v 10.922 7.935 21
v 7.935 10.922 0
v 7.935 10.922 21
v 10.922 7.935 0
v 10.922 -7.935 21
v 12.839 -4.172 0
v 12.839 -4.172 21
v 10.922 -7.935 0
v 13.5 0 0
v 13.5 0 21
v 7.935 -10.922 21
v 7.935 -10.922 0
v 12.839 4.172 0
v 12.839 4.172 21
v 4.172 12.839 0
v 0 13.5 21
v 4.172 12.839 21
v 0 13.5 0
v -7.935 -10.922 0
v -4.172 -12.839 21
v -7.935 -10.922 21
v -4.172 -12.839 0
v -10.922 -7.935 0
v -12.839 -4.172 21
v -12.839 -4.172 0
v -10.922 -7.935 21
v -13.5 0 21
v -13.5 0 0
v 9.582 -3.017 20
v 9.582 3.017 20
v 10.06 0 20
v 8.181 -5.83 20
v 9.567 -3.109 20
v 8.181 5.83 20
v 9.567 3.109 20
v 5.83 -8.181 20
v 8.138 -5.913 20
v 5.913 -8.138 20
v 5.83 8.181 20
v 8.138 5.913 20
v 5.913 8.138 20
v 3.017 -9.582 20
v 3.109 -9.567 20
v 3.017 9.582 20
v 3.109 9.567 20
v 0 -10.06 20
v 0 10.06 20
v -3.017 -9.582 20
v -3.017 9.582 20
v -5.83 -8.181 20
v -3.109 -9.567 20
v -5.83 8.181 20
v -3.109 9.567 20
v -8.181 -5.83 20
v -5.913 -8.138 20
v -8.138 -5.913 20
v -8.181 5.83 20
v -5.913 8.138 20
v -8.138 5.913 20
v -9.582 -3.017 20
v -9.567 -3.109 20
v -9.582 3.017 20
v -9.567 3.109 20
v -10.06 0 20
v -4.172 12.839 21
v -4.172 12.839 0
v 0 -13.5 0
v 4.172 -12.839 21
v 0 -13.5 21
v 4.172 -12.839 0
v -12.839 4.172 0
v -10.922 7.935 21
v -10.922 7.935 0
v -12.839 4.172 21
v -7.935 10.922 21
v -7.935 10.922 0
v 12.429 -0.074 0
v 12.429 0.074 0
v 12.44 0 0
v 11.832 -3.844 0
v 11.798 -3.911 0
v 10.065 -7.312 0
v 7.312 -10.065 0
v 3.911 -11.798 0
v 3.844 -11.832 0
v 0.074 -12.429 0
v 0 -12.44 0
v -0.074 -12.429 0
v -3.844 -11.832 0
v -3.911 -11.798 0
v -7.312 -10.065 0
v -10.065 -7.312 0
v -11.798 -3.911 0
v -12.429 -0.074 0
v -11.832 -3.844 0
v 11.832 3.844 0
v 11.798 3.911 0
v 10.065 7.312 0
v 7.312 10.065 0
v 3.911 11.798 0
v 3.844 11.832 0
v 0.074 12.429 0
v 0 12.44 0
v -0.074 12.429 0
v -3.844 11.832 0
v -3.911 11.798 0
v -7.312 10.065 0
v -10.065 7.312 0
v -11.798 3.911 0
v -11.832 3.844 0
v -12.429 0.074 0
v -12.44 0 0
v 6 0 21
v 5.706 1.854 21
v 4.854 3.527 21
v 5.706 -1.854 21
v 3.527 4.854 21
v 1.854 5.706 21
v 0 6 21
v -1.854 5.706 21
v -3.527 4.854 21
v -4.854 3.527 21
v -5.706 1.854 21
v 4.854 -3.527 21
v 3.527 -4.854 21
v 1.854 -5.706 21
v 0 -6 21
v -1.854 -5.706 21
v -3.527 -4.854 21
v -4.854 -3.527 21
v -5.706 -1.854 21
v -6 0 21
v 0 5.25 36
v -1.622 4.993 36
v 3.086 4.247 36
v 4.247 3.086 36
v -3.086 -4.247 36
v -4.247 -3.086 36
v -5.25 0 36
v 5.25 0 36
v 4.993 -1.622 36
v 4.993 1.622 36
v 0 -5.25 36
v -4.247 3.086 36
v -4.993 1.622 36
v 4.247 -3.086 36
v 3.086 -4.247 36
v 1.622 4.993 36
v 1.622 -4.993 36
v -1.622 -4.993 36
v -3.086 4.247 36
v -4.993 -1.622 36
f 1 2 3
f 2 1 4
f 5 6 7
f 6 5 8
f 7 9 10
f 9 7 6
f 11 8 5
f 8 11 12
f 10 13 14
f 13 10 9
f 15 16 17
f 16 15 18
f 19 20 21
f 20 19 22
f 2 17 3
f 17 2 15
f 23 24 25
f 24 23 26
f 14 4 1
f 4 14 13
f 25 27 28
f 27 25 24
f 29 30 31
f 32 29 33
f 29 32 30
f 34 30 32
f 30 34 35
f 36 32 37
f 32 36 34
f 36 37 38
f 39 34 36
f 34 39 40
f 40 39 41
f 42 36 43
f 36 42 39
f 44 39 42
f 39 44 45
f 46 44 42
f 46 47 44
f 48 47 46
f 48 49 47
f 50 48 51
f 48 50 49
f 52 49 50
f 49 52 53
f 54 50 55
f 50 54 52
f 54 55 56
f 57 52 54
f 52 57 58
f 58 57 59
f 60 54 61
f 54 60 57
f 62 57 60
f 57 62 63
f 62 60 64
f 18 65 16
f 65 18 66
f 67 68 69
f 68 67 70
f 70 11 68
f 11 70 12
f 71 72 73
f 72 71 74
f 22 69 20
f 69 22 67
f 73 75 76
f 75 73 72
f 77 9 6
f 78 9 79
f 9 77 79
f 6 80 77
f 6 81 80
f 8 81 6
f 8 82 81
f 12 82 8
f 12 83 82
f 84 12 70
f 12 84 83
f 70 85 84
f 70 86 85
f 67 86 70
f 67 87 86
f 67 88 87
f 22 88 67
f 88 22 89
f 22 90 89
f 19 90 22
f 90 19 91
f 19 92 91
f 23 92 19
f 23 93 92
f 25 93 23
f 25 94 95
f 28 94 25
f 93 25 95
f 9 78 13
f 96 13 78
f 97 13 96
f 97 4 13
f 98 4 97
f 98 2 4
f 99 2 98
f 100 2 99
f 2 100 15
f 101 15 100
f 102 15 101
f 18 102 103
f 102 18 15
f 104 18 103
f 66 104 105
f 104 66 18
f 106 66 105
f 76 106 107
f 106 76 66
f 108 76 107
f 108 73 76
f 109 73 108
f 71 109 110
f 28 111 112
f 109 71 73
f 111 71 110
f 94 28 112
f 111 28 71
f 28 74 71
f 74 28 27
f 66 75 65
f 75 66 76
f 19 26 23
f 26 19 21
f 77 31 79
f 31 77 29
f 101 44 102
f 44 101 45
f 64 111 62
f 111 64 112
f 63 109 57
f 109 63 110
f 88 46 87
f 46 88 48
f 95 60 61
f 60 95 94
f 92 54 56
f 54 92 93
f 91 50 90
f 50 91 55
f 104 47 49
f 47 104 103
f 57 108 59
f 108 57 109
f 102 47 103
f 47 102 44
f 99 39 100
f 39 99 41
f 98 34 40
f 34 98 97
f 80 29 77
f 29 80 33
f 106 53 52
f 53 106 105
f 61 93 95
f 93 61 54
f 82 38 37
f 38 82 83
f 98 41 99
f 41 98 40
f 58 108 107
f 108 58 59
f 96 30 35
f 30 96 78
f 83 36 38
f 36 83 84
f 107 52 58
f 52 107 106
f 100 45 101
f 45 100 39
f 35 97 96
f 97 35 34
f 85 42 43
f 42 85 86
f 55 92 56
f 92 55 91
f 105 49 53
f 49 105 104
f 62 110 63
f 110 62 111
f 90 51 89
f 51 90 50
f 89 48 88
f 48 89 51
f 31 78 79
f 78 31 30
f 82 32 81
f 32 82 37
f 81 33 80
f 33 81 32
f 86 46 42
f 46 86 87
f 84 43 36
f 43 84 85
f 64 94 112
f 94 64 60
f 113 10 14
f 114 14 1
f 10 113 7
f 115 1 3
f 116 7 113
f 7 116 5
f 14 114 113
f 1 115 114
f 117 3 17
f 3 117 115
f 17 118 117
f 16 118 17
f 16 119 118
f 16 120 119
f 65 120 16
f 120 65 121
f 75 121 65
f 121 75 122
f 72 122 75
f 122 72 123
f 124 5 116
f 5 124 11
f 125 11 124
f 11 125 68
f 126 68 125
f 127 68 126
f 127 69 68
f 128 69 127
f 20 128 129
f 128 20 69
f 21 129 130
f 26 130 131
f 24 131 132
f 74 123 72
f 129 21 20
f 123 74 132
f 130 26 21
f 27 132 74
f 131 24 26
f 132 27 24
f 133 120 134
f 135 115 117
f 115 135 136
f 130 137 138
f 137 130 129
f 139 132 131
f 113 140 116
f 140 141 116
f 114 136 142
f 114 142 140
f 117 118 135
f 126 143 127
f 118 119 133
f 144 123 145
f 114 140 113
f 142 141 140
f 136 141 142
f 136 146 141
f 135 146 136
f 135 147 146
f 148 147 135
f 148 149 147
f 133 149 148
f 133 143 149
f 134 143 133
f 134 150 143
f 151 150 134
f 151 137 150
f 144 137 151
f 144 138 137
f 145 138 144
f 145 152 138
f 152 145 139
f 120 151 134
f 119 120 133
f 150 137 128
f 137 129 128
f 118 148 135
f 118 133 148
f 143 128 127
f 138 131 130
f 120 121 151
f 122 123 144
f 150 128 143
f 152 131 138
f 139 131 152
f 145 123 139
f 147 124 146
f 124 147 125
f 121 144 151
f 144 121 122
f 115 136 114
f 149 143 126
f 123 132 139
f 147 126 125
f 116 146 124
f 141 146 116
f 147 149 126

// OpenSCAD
/*
 * Candle Adapter, v0.42
 *
 * by Alex Franke (CodeCreations), Dec 2012
 * http://www.theFrankes.com
 * 
 * Licenced under Creative Commons Attribution - Non-Commercial - Share Alike 3.0 
 * 
 * DESCRIPTION: This will allow you to put a fat candle into a smaller hole. 
 * 
 * INSTRUCTIONS:  Choose some values in the "User-defined values" section, render,
 *   and print. See the comments in that section for details on how to measure. 
 * 
 * v0.42, Dec 15, 2012: Initial Release.
 * 
 * TODO: 
 *   * Make shorter for smaller candles placed in larger holes 
 */

/////////////////////////////////////////////////////////////////////////////
// User-defined values... 
/////////////////////////////////////////////////////////////////////////////

// At the base of the candle, measure the distance the candle will be inserted into the 
// holder (fLength), the diameter of the candle at that distance form the end (fTopID), 
// and the diameter of the candle at the end (fBottomID). (This assumes a consistent 
// taper.) Finally, set the minimum thickness (thickness) of the printed material 
// surrounding the candle. 
fLength     = 20; 
fTopID      = 25; 
fBottomID   = 20; 
thickness   = 1; 

// Measure the depth of the hole (mLength), the diameter of the opening at the top 
// (mTopOD), and the diamater of the hole at the bottom (mBottomOD). (This also 
// assumes a consistent taper.)
mLength     = 15; 
mTopOD      = 12; 
mBottomOD   = 10.5; 

$fn         = 20; // general curve quality


/////////////////////////////////////////////////////////////////////////////
// The code...
/////////////////////////////////////////////////////////////////////////////
translate([0,0,thickness/2+fLength]) 
rotate([180,0,0]) 
union() {

	// Female
	translate([0,0,(fLength+thickness)/2]) 
	difference(){ 
		cylinder(h=fLength, r=fTopID/2+thickness, center=true);
		cylinder(h=fLength+1, r2=fTopID/2, r1=fBottomID/2, center=true);
	}

	cylinder(h=thickness, r=fTopID/2+thickness, center=true);

	// Male
	translate([0,0,-(mLength+thickness)/2]) 
	cylinder(h=mLength, r2=mTopOD/2, r1=mBottomOD/2, center=true);
}
